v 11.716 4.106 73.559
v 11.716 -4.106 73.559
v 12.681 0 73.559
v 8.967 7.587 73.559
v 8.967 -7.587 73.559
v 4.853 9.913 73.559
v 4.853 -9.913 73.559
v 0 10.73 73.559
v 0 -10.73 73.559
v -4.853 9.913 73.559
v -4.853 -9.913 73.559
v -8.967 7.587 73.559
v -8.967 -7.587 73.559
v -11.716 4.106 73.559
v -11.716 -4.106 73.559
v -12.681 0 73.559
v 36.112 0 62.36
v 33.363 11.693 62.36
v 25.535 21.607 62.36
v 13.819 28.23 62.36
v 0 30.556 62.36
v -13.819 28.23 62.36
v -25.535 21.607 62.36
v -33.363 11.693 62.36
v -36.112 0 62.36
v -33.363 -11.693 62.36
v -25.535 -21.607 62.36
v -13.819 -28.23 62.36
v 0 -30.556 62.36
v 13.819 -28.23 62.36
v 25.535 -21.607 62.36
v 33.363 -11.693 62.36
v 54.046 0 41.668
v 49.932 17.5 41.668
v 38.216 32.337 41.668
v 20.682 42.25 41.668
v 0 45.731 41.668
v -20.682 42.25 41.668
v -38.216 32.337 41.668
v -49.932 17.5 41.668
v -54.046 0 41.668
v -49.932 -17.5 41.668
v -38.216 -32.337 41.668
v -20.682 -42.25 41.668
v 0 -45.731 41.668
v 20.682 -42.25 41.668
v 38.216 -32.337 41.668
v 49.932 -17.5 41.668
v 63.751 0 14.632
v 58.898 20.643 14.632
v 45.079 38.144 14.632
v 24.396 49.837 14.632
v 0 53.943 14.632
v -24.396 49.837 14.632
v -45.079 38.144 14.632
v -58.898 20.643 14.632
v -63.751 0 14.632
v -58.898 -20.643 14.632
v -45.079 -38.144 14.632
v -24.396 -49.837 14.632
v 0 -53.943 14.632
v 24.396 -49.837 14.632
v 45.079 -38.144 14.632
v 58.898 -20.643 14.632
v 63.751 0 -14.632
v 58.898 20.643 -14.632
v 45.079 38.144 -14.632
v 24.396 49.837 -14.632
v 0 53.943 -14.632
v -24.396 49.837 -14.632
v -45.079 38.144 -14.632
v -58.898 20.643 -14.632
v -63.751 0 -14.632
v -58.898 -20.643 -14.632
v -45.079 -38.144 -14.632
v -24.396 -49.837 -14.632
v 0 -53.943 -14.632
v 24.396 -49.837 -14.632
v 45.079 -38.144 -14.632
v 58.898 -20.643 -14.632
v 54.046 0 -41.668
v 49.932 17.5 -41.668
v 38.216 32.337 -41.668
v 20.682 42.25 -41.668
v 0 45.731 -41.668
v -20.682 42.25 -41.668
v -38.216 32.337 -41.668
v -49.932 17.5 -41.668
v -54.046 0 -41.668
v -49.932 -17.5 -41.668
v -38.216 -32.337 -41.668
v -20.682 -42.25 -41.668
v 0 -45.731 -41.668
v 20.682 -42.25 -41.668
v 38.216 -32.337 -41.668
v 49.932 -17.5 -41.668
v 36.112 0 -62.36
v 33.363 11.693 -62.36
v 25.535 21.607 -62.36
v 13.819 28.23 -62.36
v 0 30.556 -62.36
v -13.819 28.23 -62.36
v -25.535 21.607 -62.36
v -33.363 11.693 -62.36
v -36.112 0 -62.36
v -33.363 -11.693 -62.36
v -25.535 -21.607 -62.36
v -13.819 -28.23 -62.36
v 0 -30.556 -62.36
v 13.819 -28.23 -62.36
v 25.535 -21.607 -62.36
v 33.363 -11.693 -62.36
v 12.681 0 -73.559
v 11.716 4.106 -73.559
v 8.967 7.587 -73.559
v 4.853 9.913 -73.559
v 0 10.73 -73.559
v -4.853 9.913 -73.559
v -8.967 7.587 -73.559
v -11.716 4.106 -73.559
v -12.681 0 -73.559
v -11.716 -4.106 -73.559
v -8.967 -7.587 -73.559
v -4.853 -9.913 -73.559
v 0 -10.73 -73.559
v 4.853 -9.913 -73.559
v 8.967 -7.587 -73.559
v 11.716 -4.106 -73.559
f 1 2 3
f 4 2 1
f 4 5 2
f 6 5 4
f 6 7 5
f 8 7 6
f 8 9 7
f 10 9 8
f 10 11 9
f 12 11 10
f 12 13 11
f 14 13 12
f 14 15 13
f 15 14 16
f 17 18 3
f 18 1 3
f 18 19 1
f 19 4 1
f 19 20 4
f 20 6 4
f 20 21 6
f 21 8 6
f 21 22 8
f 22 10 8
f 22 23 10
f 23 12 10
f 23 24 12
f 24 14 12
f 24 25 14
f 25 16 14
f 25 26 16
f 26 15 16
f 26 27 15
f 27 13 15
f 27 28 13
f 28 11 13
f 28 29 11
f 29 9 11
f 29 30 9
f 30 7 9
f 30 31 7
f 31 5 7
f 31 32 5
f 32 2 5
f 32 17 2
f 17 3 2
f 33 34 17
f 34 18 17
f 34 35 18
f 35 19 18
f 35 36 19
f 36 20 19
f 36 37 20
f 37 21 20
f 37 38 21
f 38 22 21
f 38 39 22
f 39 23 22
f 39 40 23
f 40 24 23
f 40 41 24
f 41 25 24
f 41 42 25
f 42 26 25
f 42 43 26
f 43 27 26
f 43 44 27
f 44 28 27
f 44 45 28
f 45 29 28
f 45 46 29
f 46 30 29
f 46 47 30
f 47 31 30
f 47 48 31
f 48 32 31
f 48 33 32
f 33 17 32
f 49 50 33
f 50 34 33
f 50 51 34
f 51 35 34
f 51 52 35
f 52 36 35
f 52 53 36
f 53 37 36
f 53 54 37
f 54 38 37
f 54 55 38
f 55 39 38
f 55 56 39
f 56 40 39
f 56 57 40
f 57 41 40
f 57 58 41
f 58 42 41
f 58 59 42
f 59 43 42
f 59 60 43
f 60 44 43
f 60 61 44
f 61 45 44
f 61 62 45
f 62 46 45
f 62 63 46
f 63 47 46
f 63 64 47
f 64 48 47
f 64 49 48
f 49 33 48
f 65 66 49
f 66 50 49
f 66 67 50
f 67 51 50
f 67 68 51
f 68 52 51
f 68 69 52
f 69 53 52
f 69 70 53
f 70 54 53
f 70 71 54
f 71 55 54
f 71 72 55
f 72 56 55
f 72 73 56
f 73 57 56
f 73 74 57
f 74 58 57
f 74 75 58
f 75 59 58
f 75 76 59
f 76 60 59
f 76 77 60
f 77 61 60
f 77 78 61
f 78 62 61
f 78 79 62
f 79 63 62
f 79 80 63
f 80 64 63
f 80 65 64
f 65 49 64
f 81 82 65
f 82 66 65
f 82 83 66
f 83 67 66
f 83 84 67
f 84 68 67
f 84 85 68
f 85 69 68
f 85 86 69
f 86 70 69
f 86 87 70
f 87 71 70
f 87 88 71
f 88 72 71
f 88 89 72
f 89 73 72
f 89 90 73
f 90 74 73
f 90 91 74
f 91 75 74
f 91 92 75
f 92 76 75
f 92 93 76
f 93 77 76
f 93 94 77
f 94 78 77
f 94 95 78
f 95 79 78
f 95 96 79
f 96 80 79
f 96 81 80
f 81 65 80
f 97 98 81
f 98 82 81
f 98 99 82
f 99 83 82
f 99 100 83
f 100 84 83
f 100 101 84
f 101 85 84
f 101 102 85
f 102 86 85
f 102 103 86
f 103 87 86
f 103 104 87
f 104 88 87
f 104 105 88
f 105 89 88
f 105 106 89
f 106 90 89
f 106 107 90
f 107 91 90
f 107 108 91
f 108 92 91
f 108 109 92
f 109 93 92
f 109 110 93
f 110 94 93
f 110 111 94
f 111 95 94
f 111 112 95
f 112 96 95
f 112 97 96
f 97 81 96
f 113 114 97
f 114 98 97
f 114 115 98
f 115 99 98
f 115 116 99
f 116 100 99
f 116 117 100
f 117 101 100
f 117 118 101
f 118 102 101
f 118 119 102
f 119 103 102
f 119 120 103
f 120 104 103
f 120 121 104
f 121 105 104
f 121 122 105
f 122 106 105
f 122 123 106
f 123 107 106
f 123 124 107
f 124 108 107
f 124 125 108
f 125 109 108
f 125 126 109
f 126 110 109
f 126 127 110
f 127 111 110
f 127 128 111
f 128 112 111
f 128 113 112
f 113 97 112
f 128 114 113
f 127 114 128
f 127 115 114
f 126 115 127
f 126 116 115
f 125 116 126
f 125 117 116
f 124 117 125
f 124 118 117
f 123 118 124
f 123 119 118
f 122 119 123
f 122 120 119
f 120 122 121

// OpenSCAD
// Generated by SolidPython 1.0.1 on 2020-07-29 00:46:51


scale(v = [13, 11, 15]) {
	sphere(r = 5);
}
/***********************************************
*********      SolidPython code:      **********
************************************************
 
# import packages: SolidPython
from solid import *
from solid.utils import *
from itertools import chain, combinations, permutations


class Resize:

    def __init__(self, scad_file):
        self.scad_file = scad_file
        #self.scad_file = import_scad(scad_file)
        # cone/cylinder param:
        self.r1 = 0
        self.r2 = 0
        self.h = 0
        # rectangular prism param:
        self.w = 0
        self.l = 0
        # ellipse param:
        self.r = 0

    # import OpenScad code (file name corresponds to shape)


    # classify shape + parameters
    def assign(self, param1, param2, param3):
        if self.scad_file == 'cone.scad':
            self.r1 = param1
            self.r2 = param2
            self.h = param3
        elif self.scad_file == 'cylinder.scad':
            self.r1 = param1
            self.r2 = param2
            self.h = param3
        elif self.scad_file == 'rectangularPrism.scad':
            self.h = param1
            self.l = param2
            self.w = param3
        else:
            self.r = param1
            self.h = param2

    # resize parameters
    def iterate(self):
        x = range(3, 20, 2)
        i = 1
        if self.scad_file == 'cone.scad':
            tempList = list(permutations(x, 2))
            for temp in tempList:
                param1 = temp[0]
                param2 = temp[1]
                filepath = 'produced_scad_files/' + 'cone' + str(param1) + '_' + str(param2) + '_' + '.scad'
                scad_render_to_file(cylinder(h=param1, r1=param2, r2=0), filepath)

        elif self.scad_file == 'cylinder.scad':
            tempList = list(permutations(x, 3))
            for temp in tempList:
                param1 = temp[0]
                param2 = temp[1]
                filepath = 'produced_scad_files/' + 'cylinder' + str(param1) + '_' + str(param2) + '_' + '.scad'
                scad_render_to_file(cylinder(h=param1, r1=param2, r2=param2), filepath)

        elif self.scad_file == 'rectangularPrism.scad':
            tempList = list(permutations(x, 3))
            for temp in tempList:
                param1 = temp[0]
                param2 = temp[1]
                param3 = temp[2]
                filepath = 'produced_scad_files/' + 'rectangularPrism' + str(param1) + '_' + str(param2) + '_' + str(
                    param3) + '.scad'
                scad_render_to_file(cube(size=(param1, param2, param3)), filepath)

        elif self.scad_file == 'ellipse.scad':
            tempList = list(permutations(x, 4))
            for temp in tempList:
                param1 = temp[0]
                param2 = temp[1]
                param3 = temp[2]
                param4 = temp[3]
                filepath = 'produced_scad_files/' + 'ellipse' + str(param1) + '_' + str(param2) + '_' + str(param3) + '_' + str(param4) + '.scad'
                scad_render_to_file(scale([param1, param2, param3])(sphere(r=param4)), filepath)

    def render_to_scadfile(self):
        scad_render_to_file(scad, 'example.scad') 
 
************************************************/
